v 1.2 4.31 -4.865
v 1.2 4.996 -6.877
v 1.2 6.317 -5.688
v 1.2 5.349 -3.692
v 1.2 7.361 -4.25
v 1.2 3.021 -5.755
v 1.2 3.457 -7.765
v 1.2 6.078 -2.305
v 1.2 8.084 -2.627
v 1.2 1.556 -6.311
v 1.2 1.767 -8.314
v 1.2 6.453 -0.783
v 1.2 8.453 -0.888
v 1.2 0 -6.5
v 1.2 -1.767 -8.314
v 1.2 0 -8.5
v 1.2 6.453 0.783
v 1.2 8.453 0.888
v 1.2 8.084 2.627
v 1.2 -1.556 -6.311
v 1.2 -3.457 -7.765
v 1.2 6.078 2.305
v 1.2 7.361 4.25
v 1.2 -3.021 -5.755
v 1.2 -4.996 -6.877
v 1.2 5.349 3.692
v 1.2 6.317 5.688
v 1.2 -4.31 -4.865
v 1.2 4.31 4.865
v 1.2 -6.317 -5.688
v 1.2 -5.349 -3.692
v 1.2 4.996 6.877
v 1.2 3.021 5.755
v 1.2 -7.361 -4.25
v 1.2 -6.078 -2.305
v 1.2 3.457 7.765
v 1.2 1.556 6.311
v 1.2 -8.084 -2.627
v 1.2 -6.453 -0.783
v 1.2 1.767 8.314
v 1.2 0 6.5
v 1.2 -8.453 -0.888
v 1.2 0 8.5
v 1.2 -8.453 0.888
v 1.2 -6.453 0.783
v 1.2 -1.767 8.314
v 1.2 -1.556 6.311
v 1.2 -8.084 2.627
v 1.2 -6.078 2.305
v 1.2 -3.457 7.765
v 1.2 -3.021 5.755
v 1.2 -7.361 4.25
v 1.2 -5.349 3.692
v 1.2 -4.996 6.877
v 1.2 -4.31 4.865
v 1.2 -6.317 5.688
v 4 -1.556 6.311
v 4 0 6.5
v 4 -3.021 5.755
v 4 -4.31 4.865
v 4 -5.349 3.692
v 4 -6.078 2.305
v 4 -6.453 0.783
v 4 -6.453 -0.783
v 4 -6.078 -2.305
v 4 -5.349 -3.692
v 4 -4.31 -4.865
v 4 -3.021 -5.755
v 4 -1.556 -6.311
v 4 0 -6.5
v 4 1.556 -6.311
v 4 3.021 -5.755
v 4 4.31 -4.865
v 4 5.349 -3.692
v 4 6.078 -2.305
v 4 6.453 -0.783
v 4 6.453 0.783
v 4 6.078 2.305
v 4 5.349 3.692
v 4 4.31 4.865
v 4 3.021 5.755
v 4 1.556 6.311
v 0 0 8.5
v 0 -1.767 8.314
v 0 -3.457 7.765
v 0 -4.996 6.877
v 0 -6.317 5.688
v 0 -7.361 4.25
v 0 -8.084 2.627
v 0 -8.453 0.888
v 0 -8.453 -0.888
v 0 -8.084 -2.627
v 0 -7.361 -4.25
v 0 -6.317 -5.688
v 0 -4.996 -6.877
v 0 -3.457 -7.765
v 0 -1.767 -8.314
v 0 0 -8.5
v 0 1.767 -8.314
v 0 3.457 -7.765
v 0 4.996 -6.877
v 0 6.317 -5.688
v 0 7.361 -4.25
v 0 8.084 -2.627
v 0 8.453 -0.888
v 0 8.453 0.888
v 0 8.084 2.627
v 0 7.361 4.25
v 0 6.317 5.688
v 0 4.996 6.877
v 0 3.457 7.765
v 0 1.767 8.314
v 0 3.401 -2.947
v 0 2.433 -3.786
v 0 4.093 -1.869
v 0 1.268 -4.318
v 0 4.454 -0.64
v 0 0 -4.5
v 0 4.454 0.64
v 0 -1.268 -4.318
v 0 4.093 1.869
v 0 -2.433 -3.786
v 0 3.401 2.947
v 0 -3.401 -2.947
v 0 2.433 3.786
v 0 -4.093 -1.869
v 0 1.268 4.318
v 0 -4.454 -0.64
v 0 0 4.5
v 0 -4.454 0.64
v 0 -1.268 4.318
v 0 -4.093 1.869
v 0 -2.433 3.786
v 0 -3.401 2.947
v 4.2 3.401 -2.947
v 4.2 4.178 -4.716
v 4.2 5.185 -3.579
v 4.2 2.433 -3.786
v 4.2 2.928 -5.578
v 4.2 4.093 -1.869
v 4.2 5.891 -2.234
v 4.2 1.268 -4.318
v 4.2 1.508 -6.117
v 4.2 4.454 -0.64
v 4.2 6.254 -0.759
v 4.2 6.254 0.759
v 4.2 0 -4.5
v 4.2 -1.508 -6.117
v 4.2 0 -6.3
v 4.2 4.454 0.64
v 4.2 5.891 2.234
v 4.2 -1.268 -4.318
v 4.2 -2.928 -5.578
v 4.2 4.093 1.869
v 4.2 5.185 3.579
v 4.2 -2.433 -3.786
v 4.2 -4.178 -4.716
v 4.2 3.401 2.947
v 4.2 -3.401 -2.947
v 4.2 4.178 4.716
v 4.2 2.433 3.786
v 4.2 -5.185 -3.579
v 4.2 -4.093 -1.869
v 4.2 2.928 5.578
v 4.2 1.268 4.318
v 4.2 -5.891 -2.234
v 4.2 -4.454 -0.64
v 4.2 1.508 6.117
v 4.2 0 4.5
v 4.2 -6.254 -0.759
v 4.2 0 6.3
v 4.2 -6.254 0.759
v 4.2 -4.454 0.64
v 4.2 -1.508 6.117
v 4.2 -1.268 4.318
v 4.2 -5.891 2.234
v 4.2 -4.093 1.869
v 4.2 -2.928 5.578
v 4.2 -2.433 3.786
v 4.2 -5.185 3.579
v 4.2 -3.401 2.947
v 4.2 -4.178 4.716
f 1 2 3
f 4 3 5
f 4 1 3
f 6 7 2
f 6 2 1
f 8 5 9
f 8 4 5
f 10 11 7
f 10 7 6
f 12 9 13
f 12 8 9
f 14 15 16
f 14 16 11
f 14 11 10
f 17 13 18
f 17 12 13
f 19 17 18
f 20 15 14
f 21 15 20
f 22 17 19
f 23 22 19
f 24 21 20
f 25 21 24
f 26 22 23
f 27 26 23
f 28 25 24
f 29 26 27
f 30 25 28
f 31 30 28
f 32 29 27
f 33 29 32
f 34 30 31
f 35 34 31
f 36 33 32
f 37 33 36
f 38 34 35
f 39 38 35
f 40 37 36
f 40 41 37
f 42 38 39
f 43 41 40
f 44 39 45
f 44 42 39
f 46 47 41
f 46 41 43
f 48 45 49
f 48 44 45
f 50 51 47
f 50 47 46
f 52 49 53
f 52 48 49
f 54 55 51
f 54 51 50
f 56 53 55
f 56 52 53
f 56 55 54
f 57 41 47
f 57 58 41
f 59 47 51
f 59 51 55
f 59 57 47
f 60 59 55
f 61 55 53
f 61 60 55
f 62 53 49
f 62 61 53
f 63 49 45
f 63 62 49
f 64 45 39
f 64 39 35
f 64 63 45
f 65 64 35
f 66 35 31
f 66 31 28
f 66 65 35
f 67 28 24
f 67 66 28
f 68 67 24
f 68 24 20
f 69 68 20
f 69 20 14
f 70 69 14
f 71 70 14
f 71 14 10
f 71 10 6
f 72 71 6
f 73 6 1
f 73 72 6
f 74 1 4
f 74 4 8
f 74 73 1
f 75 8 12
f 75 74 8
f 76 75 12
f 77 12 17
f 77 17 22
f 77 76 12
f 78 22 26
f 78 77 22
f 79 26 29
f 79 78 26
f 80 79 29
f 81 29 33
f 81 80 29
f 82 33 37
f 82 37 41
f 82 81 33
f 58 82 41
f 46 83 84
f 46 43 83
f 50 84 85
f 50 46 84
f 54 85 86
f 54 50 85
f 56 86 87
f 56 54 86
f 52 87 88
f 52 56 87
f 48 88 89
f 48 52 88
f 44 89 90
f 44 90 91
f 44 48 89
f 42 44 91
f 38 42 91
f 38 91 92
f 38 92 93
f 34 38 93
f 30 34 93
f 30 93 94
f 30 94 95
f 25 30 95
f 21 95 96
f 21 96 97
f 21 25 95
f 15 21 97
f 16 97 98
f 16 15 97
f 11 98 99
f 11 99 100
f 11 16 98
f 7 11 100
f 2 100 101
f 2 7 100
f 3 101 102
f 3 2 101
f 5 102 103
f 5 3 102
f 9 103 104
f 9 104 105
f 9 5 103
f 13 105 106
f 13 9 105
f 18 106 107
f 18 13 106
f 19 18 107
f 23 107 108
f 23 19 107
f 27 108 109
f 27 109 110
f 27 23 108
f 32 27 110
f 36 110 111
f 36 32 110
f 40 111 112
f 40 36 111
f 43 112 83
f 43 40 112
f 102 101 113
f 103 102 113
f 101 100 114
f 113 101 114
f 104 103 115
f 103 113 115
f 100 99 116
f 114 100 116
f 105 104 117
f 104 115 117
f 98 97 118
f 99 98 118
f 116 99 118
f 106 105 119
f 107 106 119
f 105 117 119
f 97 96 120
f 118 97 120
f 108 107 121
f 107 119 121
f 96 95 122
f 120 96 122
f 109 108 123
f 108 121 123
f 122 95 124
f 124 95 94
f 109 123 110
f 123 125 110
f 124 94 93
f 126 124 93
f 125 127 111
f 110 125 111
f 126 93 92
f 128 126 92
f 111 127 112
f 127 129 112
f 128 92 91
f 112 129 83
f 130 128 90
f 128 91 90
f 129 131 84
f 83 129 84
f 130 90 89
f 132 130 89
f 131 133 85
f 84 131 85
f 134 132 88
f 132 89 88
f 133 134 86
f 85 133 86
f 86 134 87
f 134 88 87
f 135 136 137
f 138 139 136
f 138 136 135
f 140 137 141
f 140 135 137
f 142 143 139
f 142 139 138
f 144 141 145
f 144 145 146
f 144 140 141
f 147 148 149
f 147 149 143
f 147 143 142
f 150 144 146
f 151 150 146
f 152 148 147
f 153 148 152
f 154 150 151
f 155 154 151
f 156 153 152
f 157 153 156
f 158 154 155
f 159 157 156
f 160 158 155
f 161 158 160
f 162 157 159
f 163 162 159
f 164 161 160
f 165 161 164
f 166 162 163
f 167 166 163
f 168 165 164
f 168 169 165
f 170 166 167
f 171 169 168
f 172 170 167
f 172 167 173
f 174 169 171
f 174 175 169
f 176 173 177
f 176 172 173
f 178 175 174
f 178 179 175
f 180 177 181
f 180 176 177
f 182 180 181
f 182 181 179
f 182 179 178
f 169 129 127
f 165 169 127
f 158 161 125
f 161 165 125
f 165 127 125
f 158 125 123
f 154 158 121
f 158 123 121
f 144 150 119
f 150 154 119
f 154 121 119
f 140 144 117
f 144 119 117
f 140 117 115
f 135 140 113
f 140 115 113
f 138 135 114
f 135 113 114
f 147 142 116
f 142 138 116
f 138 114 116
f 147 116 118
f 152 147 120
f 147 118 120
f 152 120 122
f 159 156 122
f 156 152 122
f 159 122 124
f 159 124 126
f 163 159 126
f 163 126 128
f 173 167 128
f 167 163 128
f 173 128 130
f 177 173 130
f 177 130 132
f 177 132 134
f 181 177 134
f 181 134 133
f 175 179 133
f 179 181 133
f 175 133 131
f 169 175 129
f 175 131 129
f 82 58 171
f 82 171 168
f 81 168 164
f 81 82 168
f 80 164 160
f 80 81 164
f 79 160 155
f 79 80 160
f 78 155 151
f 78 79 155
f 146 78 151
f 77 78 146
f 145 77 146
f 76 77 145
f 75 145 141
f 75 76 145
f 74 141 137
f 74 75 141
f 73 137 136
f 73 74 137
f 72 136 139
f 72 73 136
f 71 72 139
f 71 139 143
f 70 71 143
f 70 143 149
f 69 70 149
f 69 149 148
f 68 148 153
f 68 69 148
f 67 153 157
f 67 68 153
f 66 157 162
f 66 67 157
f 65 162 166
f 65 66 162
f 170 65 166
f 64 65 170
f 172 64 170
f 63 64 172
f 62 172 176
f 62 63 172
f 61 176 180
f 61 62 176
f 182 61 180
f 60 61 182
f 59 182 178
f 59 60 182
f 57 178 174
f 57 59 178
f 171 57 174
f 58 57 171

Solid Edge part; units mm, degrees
sketch "Sketch1" plane through (0, 0, 0) normal (0, -1, 0) x (1, 0, 0)
  line L0 (4.2, 4.5) -> (0, 4.5)
  line L1 (0, 4.5) -> (0, 8.5)
  line L2 (0, 8.5) -> (1.2, 8.5)
  line L3 (1.2, 8.5) -> (1.2, 6.5)
  line L4 (1.2, 6.5) -> (4.2, 6.5)
  line L5 (4.2, 6.5) -> (4.2, 4.5)
revolve "RevolvedProtrusion1" add sketch "Sketch1" angle 360 about axis through (0, 0, 0) along (1, 0, 0)
chamfer "Chamfer1" distance 0.2 angle 45 1 edges at (4.2, 0, -6.5)
